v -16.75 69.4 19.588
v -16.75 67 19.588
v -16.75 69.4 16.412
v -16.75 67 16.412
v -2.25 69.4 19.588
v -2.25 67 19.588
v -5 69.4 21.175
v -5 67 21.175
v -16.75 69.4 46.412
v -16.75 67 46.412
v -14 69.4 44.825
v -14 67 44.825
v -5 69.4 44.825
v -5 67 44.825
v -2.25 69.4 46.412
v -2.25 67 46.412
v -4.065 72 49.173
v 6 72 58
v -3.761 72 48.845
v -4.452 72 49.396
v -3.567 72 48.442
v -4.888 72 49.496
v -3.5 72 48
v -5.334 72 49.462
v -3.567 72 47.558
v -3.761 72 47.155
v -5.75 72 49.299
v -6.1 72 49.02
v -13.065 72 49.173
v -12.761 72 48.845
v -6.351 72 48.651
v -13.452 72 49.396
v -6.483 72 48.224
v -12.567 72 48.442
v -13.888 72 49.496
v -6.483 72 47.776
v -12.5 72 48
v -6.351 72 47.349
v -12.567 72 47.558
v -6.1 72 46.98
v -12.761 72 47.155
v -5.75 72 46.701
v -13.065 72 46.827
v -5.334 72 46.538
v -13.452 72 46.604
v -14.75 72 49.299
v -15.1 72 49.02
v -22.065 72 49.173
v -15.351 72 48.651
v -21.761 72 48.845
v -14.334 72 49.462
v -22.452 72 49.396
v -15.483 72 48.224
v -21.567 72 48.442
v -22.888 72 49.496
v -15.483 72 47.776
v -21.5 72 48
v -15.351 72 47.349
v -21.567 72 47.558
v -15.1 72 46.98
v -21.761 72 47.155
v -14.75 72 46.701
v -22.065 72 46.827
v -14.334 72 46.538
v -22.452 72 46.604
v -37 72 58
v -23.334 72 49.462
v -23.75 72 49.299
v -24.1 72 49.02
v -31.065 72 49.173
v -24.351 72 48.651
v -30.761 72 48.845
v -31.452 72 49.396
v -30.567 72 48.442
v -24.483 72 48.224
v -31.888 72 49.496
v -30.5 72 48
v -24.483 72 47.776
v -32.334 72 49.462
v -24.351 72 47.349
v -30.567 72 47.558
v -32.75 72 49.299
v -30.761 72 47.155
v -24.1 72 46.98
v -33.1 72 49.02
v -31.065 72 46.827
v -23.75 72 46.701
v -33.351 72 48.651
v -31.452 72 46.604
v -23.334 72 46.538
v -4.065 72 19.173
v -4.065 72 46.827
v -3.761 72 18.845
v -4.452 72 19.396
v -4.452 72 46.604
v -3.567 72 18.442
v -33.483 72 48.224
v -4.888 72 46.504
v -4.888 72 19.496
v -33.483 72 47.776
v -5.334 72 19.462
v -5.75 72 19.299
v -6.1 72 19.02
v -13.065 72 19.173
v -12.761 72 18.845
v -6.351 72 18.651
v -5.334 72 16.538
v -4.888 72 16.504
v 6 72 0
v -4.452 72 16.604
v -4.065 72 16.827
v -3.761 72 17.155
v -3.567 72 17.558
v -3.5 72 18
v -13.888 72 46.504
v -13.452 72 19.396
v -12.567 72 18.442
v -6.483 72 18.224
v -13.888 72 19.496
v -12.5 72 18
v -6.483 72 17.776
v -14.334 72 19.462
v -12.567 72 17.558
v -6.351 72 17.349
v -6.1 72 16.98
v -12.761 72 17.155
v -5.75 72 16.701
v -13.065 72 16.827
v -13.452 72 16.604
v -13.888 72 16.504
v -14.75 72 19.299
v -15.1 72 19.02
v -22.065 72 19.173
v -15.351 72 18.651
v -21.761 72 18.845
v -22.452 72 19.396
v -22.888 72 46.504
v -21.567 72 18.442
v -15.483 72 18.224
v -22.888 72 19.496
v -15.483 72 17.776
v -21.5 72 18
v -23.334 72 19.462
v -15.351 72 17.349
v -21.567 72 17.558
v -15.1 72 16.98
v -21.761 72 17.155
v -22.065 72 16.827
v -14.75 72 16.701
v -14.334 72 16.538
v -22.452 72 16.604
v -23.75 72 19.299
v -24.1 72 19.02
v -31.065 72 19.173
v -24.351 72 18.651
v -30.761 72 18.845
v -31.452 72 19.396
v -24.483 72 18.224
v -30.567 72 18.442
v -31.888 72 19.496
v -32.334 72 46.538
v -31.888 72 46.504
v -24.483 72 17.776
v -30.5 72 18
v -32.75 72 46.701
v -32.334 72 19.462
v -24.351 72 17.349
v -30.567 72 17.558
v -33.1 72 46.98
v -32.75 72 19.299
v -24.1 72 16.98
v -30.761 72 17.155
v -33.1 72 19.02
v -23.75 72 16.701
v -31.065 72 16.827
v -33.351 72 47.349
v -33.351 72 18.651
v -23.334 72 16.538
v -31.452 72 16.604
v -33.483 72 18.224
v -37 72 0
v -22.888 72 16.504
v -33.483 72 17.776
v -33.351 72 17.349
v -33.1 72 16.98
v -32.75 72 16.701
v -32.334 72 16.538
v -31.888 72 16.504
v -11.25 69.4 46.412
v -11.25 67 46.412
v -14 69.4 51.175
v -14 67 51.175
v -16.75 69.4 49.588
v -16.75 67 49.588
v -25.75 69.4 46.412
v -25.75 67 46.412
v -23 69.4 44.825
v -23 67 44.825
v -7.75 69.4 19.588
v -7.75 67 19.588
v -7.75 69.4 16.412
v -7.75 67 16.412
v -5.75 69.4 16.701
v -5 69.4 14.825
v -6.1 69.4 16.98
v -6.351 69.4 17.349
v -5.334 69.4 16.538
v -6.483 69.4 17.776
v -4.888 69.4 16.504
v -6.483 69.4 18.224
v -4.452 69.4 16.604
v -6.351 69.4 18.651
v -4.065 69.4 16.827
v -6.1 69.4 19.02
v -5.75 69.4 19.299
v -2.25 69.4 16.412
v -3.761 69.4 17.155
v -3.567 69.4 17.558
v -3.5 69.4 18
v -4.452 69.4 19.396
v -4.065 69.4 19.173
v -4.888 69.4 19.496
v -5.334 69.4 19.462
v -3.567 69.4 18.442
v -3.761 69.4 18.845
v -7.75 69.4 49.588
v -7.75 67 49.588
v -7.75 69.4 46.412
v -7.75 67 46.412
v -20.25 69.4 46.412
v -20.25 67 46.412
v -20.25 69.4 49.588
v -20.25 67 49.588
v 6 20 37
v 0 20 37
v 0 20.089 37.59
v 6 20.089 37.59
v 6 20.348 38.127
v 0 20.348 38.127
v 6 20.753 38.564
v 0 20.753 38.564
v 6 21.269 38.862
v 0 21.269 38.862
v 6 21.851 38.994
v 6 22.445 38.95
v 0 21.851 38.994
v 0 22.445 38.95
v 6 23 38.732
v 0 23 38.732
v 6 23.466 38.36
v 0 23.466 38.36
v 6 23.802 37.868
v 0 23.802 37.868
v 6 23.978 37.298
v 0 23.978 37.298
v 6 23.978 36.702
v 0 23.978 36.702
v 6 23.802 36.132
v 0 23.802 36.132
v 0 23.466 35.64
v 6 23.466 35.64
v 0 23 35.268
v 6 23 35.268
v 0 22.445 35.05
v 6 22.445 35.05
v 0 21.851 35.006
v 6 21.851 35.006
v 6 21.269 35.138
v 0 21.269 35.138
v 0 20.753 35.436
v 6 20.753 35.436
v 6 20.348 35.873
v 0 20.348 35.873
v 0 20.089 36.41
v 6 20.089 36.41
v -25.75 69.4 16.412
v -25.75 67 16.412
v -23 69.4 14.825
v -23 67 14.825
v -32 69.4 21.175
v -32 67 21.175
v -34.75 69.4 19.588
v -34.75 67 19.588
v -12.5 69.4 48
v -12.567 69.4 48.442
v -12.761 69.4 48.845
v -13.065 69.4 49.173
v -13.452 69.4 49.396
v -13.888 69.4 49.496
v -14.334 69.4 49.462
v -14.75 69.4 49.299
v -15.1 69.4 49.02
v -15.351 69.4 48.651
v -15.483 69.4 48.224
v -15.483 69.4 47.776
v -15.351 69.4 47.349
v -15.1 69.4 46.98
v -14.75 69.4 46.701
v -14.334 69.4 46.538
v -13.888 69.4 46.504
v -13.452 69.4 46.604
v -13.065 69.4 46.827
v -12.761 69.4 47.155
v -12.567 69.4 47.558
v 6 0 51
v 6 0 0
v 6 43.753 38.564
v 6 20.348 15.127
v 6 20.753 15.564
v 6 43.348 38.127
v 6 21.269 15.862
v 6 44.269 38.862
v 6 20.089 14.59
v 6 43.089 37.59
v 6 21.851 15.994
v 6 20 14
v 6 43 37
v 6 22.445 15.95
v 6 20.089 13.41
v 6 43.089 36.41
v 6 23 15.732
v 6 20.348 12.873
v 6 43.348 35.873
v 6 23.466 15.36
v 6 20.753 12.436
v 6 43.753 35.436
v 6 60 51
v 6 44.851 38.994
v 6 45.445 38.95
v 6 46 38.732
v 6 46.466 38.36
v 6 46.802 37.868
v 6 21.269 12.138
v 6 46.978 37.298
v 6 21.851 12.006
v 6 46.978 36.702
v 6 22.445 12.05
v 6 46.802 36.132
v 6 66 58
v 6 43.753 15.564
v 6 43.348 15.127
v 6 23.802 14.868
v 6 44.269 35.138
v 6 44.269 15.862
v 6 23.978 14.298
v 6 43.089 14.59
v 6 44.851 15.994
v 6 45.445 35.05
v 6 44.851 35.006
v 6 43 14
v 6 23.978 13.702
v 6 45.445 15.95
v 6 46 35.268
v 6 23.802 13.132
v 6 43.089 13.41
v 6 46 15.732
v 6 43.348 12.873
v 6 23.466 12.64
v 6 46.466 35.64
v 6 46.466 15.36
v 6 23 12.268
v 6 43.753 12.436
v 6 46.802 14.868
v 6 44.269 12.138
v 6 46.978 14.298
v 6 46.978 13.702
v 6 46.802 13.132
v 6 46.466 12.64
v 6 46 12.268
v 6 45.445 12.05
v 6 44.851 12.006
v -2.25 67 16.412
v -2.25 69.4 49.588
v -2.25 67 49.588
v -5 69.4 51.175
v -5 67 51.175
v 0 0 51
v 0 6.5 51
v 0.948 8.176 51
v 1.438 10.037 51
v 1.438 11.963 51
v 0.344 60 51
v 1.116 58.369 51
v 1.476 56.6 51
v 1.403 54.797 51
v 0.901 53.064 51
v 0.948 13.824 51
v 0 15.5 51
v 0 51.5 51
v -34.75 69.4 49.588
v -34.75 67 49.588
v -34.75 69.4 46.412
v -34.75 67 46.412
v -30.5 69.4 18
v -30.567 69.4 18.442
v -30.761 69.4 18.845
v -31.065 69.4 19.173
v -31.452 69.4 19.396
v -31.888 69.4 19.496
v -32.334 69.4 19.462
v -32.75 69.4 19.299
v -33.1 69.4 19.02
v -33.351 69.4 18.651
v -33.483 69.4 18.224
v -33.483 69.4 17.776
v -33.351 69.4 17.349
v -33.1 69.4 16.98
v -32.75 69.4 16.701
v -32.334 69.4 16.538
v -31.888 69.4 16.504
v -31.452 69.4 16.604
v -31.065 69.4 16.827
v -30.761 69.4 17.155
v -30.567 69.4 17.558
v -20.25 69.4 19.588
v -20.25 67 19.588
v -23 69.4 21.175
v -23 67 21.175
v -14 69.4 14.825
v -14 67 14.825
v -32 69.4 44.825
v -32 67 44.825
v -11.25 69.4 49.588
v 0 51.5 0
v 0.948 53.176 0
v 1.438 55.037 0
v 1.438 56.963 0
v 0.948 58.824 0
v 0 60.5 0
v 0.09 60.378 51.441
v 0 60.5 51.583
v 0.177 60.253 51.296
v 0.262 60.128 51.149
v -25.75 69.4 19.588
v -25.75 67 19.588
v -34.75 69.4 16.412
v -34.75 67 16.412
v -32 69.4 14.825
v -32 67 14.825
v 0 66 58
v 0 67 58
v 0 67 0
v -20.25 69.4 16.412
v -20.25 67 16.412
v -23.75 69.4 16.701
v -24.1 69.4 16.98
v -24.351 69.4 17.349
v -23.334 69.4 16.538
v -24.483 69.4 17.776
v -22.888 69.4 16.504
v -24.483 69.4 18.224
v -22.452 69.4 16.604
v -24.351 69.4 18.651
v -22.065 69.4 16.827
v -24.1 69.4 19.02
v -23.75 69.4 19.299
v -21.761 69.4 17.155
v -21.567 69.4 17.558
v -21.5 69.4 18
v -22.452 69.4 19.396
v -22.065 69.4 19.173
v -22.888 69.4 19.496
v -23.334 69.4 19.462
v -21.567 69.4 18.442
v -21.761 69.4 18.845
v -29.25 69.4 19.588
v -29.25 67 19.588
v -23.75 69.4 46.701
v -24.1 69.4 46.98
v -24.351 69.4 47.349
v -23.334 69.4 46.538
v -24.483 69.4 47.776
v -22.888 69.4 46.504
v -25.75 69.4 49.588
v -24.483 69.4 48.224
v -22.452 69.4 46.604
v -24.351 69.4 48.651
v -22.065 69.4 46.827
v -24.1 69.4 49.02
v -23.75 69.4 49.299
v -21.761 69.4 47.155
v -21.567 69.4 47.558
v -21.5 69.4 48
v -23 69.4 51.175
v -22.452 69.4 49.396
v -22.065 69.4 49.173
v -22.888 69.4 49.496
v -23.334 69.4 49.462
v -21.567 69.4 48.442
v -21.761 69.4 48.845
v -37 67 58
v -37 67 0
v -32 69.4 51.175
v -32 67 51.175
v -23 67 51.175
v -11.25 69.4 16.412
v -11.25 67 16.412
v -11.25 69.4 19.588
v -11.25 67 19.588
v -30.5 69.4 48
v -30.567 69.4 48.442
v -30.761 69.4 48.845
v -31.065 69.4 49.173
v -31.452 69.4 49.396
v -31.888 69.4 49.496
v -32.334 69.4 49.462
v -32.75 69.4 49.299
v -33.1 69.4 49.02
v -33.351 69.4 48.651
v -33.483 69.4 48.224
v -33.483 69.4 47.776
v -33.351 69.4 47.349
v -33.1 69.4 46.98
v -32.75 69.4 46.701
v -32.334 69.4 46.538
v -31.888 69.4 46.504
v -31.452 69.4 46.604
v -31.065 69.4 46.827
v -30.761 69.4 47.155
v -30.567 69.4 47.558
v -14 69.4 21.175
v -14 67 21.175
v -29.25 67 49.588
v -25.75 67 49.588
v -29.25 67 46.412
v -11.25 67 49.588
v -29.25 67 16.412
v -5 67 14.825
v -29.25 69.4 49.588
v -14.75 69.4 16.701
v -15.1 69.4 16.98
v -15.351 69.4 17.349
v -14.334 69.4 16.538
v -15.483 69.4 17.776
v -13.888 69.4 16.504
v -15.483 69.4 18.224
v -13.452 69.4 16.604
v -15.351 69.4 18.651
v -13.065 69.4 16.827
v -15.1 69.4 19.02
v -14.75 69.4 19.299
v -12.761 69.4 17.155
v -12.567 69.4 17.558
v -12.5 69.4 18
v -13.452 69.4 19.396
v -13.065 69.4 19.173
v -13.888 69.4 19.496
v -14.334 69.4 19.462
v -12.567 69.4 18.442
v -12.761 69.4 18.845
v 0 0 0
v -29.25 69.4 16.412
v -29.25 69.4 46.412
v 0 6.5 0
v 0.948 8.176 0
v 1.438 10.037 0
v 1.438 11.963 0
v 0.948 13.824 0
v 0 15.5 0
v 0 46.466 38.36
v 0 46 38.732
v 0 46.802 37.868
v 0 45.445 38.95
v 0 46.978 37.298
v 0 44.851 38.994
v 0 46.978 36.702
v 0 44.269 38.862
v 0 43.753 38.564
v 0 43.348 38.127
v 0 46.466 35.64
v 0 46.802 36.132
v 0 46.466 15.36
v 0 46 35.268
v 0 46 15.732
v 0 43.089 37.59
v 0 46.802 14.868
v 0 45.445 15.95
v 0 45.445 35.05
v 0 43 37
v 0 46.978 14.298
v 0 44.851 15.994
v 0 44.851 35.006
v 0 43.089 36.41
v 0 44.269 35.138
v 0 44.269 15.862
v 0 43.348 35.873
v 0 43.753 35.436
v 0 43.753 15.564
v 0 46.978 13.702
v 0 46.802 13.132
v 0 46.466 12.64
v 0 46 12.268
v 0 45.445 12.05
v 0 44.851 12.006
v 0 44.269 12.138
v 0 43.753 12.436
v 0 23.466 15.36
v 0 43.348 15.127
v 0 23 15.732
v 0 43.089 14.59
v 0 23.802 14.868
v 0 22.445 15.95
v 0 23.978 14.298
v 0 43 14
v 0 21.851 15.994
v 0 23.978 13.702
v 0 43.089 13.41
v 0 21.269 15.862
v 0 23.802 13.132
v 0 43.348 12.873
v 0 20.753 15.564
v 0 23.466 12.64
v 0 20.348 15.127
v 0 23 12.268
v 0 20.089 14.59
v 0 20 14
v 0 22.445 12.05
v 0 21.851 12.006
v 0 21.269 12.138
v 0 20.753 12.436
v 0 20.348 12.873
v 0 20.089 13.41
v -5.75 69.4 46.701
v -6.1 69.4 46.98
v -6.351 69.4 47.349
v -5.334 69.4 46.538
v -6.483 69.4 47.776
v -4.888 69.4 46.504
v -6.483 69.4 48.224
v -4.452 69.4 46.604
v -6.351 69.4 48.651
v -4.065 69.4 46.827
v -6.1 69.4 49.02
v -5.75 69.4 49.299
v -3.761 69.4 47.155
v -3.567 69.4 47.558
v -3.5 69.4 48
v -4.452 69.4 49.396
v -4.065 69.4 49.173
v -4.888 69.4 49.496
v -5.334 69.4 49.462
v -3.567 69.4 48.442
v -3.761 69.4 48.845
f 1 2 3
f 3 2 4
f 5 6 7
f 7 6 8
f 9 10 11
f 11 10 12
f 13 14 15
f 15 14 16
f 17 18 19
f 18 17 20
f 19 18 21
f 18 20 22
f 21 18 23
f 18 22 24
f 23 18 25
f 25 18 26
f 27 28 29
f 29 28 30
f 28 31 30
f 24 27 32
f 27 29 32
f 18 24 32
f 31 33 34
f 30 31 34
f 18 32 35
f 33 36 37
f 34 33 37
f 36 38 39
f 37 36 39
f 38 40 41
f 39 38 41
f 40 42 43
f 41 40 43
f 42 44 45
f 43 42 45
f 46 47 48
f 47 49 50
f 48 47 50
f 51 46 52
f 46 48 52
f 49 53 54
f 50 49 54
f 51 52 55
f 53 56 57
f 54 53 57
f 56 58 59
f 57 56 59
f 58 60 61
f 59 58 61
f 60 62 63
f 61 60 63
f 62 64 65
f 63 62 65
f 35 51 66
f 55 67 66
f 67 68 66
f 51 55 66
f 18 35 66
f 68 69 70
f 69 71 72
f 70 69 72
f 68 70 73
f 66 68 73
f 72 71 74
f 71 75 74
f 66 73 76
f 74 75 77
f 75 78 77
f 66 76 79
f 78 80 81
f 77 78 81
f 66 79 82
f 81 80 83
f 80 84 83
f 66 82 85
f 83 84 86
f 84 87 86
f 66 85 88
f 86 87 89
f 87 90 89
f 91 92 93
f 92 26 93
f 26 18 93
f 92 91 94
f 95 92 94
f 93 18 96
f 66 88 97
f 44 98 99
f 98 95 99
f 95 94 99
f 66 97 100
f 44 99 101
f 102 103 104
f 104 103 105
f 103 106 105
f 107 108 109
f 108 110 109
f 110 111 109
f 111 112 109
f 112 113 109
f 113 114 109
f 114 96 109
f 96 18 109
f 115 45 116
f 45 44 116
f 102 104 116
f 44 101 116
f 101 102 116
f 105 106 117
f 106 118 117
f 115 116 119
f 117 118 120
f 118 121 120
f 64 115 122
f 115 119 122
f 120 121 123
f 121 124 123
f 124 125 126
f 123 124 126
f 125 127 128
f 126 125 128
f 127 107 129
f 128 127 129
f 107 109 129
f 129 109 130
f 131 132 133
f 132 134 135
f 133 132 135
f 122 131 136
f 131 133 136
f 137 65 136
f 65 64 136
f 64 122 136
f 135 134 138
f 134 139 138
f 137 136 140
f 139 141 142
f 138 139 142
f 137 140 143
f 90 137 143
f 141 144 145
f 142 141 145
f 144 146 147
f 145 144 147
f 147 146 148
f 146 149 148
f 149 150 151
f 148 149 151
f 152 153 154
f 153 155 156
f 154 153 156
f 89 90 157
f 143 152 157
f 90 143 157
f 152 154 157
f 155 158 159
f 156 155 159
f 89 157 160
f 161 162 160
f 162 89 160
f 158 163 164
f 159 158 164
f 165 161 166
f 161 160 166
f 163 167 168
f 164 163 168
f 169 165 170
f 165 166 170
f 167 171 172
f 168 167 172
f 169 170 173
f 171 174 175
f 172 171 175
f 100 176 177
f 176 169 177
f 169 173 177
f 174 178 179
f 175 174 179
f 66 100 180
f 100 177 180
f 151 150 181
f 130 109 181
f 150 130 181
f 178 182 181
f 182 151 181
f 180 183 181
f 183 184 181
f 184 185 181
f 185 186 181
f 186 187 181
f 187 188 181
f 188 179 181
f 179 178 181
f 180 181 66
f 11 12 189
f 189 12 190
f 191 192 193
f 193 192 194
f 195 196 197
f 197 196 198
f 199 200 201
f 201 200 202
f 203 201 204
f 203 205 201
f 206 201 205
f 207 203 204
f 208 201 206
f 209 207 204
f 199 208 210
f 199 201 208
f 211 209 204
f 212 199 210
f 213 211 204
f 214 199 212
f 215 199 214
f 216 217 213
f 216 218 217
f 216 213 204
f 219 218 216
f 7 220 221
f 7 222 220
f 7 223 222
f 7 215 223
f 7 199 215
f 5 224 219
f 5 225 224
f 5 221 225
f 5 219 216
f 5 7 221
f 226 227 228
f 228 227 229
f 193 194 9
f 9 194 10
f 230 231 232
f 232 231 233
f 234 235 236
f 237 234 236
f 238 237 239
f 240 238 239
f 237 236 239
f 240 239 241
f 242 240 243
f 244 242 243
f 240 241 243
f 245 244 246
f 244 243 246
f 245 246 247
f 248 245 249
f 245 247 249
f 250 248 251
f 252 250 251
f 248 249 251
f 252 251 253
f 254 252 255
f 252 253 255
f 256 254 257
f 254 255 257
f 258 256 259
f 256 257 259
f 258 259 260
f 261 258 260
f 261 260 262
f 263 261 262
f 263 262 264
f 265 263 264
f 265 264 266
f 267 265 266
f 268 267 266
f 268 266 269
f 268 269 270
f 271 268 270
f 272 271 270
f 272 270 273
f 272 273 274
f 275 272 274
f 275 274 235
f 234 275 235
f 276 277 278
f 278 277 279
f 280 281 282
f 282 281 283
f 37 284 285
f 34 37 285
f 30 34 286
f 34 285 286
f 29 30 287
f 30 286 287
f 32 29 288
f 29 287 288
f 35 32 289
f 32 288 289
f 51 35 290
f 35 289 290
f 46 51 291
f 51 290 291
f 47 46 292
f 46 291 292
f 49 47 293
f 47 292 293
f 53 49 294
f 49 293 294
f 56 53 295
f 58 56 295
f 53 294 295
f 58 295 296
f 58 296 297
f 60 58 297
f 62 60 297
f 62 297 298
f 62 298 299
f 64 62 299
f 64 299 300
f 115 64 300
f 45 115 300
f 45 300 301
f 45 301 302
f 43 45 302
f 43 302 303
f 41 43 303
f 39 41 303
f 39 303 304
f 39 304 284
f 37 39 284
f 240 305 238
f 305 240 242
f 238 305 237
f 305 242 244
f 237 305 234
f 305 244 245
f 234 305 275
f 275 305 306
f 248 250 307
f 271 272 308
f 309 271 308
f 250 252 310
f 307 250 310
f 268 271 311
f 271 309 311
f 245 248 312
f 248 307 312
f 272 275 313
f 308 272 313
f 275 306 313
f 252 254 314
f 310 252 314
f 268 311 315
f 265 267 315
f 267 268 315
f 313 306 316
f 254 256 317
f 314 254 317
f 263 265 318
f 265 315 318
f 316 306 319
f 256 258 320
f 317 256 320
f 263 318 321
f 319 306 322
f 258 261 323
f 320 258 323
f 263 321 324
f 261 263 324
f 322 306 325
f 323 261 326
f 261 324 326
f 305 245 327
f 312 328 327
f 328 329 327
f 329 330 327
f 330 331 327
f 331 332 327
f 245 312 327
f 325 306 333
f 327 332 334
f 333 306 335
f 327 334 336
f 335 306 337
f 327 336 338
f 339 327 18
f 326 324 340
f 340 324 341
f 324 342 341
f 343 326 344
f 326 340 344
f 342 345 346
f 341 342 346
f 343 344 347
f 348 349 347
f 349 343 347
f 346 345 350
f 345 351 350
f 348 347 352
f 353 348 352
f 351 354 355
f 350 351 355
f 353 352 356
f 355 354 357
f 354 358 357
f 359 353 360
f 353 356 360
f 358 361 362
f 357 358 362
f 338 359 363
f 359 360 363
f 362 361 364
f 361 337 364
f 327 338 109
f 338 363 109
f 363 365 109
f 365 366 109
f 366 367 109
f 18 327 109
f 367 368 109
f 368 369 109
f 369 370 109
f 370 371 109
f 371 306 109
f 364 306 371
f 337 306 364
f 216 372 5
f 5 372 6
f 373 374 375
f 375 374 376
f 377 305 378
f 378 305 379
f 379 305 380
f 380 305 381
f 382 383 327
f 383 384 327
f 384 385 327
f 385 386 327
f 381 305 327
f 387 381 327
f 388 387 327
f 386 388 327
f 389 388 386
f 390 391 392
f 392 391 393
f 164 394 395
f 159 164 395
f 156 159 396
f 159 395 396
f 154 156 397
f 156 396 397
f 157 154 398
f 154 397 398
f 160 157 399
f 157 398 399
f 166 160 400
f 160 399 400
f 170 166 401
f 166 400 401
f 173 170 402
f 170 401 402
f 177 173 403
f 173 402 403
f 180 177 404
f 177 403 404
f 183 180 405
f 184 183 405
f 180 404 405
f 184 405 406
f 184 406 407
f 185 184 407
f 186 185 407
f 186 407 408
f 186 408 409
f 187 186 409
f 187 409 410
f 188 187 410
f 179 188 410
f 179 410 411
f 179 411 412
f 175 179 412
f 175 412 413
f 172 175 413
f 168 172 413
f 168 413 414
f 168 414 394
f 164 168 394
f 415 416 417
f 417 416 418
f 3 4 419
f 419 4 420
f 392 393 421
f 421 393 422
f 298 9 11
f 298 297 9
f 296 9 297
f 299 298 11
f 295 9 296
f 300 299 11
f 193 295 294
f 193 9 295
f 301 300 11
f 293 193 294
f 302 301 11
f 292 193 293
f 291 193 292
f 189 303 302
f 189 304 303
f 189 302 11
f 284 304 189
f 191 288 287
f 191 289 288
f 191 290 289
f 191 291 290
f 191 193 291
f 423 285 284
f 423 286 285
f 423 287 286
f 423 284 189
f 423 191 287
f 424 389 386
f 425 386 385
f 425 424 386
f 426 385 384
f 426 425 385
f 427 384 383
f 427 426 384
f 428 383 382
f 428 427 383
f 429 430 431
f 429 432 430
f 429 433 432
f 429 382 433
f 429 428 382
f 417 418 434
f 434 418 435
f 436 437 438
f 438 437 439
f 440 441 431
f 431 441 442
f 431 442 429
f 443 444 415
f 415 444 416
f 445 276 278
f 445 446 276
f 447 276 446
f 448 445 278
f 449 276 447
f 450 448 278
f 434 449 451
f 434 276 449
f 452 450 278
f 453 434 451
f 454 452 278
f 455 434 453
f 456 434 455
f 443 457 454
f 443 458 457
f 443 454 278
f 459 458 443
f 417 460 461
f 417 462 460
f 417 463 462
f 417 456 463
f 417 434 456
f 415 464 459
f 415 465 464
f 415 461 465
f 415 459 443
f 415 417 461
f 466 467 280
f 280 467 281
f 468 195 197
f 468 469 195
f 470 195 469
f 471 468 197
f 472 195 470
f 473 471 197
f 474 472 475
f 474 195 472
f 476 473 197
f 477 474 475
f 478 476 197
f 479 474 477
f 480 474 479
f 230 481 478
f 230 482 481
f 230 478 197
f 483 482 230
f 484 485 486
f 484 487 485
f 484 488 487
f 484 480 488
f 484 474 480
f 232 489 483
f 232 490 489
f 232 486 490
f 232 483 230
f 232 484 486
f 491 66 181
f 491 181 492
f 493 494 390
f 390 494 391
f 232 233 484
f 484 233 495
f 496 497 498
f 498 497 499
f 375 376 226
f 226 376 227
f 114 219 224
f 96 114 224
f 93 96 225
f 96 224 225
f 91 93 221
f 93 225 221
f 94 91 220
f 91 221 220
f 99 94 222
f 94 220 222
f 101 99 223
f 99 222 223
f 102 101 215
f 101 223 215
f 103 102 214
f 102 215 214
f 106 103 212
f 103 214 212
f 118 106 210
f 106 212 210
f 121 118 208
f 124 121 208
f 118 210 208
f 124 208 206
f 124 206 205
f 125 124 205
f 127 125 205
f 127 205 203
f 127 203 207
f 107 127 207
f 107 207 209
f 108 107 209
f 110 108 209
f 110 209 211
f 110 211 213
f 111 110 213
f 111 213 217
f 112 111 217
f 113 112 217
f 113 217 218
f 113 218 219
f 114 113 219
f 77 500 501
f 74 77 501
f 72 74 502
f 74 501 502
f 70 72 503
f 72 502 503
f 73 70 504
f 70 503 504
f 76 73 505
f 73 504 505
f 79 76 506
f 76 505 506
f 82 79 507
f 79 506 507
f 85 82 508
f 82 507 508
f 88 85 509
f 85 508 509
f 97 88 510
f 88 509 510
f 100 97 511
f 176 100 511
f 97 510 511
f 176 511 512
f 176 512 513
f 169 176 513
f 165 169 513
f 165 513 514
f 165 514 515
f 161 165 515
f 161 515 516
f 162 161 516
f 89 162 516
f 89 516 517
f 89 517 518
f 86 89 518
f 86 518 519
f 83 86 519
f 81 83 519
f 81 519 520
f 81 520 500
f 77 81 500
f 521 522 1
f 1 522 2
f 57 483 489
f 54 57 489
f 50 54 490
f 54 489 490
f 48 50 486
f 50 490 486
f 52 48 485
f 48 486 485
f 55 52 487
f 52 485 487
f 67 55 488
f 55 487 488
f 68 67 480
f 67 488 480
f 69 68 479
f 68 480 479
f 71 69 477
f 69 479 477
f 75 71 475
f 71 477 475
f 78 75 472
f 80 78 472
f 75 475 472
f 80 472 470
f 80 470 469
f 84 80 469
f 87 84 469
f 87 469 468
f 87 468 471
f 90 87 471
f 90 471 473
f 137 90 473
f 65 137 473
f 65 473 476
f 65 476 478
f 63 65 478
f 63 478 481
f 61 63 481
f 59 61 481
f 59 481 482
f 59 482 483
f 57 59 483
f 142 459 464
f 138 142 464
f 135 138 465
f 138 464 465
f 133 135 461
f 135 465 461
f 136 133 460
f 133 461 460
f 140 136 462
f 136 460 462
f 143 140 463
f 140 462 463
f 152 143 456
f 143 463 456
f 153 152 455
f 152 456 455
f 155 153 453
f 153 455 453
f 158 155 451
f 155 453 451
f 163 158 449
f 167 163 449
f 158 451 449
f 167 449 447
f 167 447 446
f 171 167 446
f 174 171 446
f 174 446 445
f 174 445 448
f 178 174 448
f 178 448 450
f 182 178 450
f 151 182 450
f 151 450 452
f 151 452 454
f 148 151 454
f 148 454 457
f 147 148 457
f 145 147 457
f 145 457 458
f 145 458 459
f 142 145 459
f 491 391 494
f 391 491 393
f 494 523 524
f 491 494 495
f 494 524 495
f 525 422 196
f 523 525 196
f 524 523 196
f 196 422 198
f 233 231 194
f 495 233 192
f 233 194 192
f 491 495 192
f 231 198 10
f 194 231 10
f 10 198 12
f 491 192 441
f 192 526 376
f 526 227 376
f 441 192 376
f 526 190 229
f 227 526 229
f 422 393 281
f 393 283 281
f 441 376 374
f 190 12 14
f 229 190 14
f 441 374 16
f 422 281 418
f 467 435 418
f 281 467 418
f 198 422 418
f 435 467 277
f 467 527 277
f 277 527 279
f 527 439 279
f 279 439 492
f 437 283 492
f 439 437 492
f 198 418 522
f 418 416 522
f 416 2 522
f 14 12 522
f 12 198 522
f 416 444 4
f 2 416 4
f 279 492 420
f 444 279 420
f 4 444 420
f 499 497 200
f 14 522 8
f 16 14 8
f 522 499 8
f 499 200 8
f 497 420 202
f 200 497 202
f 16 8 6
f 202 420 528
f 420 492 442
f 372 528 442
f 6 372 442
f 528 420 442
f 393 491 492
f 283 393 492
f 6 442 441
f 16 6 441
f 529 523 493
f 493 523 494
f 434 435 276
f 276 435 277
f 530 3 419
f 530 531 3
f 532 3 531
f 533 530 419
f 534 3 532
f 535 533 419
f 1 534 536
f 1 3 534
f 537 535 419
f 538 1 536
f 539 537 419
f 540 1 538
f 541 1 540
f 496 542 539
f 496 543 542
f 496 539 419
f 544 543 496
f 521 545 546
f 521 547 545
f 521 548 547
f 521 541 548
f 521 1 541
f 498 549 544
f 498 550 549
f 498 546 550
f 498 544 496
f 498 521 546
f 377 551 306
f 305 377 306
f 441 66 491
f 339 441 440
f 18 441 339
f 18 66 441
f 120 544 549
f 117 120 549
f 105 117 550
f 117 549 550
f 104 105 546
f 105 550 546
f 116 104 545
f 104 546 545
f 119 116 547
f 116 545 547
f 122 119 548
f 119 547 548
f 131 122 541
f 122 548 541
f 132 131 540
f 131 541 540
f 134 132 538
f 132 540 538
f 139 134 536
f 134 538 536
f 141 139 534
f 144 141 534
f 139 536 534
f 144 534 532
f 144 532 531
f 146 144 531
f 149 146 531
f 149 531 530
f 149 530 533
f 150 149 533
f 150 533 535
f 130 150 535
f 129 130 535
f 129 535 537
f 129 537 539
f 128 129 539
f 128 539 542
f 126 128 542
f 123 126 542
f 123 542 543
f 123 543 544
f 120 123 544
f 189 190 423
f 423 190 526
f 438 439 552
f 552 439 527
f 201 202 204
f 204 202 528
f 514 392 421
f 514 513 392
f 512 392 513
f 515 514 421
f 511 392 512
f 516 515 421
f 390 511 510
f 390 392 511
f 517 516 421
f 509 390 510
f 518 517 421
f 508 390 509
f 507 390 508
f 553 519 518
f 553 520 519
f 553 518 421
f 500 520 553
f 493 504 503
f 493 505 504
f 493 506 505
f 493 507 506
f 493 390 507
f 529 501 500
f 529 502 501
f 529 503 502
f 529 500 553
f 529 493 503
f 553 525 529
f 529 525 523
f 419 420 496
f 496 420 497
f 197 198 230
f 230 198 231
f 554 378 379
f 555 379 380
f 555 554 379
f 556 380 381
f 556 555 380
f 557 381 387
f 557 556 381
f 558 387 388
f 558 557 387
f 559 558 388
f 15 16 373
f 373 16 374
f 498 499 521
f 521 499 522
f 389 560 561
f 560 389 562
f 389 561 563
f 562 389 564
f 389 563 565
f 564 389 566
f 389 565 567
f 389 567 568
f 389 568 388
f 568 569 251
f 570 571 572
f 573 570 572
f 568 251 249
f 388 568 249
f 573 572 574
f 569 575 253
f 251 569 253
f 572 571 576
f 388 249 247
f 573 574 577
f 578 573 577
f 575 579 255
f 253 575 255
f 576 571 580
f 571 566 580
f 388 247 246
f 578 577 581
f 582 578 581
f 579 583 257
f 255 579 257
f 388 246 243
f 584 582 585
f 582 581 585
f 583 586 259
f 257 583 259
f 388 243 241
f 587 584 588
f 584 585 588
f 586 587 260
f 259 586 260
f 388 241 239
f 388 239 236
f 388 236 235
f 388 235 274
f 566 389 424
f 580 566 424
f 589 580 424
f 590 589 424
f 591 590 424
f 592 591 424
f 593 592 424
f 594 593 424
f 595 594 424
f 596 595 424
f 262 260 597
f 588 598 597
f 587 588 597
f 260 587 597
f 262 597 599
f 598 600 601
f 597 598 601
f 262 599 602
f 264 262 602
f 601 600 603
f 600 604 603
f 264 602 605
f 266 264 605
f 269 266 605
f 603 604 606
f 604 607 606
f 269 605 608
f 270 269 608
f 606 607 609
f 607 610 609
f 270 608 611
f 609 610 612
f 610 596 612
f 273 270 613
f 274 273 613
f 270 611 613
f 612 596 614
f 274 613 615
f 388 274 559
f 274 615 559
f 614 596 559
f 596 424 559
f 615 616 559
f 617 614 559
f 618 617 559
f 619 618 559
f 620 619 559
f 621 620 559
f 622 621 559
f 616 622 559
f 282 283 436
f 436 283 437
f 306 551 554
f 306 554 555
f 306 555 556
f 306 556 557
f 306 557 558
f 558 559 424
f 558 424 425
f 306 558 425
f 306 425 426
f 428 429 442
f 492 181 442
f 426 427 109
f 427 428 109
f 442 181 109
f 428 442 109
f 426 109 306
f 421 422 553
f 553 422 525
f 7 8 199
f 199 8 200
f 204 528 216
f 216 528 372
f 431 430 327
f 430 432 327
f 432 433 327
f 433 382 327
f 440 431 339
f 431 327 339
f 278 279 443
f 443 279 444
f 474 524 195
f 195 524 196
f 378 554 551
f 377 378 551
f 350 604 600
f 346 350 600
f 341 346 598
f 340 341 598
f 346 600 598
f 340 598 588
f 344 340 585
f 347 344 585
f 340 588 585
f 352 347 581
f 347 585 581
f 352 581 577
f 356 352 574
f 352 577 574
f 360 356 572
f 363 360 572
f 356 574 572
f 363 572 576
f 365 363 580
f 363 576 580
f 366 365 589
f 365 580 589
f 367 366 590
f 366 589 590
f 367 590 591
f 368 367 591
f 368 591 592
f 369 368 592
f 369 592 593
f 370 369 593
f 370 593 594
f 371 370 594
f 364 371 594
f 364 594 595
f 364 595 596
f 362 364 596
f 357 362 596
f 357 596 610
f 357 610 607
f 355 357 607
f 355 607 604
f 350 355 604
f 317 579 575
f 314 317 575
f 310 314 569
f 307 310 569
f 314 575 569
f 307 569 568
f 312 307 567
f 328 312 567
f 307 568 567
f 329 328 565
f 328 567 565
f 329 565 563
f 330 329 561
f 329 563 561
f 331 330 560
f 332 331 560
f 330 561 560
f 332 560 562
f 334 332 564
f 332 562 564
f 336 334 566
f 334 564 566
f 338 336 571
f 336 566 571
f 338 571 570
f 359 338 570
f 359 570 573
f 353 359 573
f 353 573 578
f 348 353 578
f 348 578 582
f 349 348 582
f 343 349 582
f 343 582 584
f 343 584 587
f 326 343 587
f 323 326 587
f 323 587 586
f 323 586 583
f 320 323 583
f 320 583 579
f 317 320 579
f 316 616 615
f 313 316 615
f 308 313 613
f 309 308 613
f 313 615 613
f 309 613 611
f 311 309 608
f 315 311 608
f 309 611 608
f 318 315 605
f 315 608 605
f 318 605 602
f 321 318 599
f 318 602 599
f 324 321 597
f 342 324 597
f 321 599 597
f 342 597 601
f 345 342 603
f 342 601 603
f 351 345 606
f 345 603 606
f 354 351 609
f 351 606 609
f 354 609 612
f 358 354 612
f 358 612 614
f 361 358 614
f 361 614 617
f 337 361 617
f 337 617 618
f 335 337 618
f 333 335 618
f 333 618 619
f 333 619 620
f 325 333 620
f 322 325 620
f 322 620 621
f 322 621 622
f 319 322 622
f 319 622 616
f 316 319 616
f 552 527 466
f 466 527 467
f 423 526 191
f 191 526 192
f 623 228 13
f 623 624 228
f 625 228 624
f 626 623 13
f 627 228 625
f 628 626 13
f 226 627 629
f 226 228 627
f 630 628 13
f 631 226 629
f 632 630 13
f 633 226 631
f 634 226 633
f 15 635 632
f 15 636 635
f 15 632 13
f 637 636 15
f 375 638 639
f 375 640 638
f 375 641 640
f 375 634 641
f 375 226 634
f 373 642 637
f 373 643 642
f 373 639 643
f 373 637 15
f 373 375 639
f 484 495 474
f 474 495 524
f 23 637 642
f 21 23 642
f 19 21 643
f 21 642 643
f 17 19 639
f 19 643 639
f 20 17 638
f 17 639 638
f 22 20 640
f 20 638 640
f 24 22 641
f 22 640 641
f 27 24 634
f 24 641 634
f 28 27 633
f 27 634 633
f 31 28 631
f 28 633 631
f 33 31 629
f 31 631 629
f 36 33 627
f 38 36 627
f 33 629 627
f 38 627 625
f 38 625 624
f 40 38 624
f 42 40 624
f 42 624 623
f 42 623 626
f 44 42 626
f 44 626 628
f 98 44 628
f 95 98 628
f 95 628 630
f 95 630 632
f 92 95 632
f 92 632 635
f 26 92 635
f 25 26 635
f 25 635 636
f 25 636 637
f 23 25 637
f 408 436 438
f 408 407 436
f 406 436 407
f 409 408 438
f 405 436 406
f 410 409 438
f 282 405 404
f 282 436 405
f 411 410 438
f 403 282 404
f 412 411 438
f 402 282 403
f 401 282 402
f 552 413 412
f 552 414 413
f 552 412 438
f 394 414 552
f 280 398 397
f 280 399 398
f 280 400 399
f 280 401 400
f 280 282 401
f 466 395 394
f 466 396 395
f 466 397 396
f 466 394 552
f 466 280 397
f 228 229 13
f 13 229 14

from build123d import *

# Parameters (mm, degrees)
F1_DEPTH  = 58
F2_R      = 2
F3_DEPTH  = 6.001
F4_R      = 7.5
F5_DEPTH  = 58.001
F7_DEPTH  = 43.001
F8_R      = 1.5
F9_DEPTH  = 2.4
F10_DEPTH = 5.001002


with BuildPart() as f1:
    # F0 (on Top) → F1 (new body)
    with BuildSketch(Plane.XY):
        Polygon((0, 67), (0, 0), (6, 0), (6, 72.000002), (-37, 72.000002), (-37, 67), align=None)
    extrude(amount=F1_DEPTH)

    # F2 (on face) → F3 (cut, through all)
    with BuildSketch(Plane(origin=(0, 0, 0), x_dir=(0, -1, 0), z_dir=(-1, 0, 0))):
        with Locations((-45, 37)):
            Circle(F2_R)
        with Locations((-45, 14)):
            Circle(F2_R)
        with Locations((-22, 14)):
            Circle(F2_R)
        with Locations((-22, 37)):
            Circle(F2_R)
    extrude(amount=-F3_DEPTH, mode=Mode.SUBTRACT)

    # F4 (on face) → F5 (cut, through all)
    with BuildSketch(Plane.XY):
        with Locations((-6, 11)):
            Circle(F4_R)
        with Locations((-6, 56)):
            Circle(F4_R)
    extrude(amount=F5_DEPTH, mode=Mode.SUBTRACT)

    # F6 (on face) → F7 (cut, through all)
    with BuildSketch(Plane.YZ.offset(6)):
        Polygon((60.000002, 51), (66.000002, 58), (0, 58), (0, 51), align=None)
    extrude(amount=-F7_DEPTH, mode=Mode.SUBTRACT)

    # F8 (on face) → F9 (cut)
    with BuildSketch(Plane.XZ.offset(-67)):
        Polygon((-7.75, 49.587713), (-7.75, 46.412287), (-5, 44.824574), (-2.25, 46.412287), (-2.25, 49.587713), (-5, 51.175426), align=None)
        with Locations((-5, 48)):
            Circle(F8_R, mode=Mode.SUBTRACT)
        Polygon((-2.25, 16.412287), (-2.25, 19.587713), (-5, 21.175426), (-7.75, 19.587713), (-7.75, 16.412287), (-5, 14.824574), align=None)
        with Locations((-5, 18)):
            Circle(F8_R, mode=Mode.SUBTRACT)
        Polygon((-11.25, 46.412287), (-11.25, 49.587713), (-14, 51.175426), (-16.75, 49.587713), (-16.75, 46.412287), (-14, 44.824574), align=None)
        with Locations((-14, 48)):
            Circle(F8_R, mode=Mode.SUBTRACT)
        Polygon((-11.25, 16.412287), (-11.25, 19.587713), (-14, 21.175426), (-16.75, 19.587713), (-16.75, 16.412287), (-14, 14.824574), align=None)
        with Locations((-14, 18)):
            Circle(F8_R, mode=Mode.SUBTRACT)
        Polygon((-20.25, 46.412287), (-20.25, 49.587713), (-23, 51.175426), (-25.75, 49.587713), (-25.75, 46.412287), (-23, 44.824574), align=None)
        with Locations((-23, 48)):
            Circle(F8_R, mode=Mode.SUBTRACT)
        Polygon((-20.25, 16.412287), (-20.25, 19.587713), (-23, 21.175426), (-25.75, 19.587713), (-25.75, 16.412287), (-23, 14.824574), align=None)
        with Locations((-23, 18)):
            Circle(F8_R, mode=Mode.SUBTRACT)
        Polygon((-29.25, 46.412287), (-29.25, 49.587713), (-32, 51.175426), (-34.75, 49.587713), (-34.75, 46.412287), (-32, 44.824574), align=None)
        with Locations((-32, 48)):
            Circle(F8_R, mode=Mode.SUBTRACT)
        Polygon((-29.25, 16.412287), (-29.25, 19.587713), (-32, 21.175426), (-34.75, 19.587713), (-34.75, 16.412287), (-32, 14.824574), align=None)
        with Locations((-32, 18)):
            Circle(F8_R, mode=Mode.SUBTRACT)
    extrude(amount=-F9_DEPTH, mode=Mode.SUBTRACT)

    # F8 (on face) → F10 (cut, through all)
    with BuildSketch(Plane.XZ.offset(-67)):
        with Locations((-32, 48)):
            Circle(F8_R)
        with Locations((-23, 48)):
            Circle(F8_R)
        with Locations((-14, 48)):
            Circle(F8_R)
        with Locations((-5, 48)):
            Circle(F8_R)
        with Locations((-32, 18)):
            Circle(F8_R)
        with Locations((-23, 18)):
            Circle(F8_R)
        with Locations((-14, 18)):
            Circle(F8_R)
        with Locations((-5, 18)):
            Circle(F8_R)
    extrude(amount=-F10_DEPTH, mode=Mode.SUBTRACT)


solid = f1.part
